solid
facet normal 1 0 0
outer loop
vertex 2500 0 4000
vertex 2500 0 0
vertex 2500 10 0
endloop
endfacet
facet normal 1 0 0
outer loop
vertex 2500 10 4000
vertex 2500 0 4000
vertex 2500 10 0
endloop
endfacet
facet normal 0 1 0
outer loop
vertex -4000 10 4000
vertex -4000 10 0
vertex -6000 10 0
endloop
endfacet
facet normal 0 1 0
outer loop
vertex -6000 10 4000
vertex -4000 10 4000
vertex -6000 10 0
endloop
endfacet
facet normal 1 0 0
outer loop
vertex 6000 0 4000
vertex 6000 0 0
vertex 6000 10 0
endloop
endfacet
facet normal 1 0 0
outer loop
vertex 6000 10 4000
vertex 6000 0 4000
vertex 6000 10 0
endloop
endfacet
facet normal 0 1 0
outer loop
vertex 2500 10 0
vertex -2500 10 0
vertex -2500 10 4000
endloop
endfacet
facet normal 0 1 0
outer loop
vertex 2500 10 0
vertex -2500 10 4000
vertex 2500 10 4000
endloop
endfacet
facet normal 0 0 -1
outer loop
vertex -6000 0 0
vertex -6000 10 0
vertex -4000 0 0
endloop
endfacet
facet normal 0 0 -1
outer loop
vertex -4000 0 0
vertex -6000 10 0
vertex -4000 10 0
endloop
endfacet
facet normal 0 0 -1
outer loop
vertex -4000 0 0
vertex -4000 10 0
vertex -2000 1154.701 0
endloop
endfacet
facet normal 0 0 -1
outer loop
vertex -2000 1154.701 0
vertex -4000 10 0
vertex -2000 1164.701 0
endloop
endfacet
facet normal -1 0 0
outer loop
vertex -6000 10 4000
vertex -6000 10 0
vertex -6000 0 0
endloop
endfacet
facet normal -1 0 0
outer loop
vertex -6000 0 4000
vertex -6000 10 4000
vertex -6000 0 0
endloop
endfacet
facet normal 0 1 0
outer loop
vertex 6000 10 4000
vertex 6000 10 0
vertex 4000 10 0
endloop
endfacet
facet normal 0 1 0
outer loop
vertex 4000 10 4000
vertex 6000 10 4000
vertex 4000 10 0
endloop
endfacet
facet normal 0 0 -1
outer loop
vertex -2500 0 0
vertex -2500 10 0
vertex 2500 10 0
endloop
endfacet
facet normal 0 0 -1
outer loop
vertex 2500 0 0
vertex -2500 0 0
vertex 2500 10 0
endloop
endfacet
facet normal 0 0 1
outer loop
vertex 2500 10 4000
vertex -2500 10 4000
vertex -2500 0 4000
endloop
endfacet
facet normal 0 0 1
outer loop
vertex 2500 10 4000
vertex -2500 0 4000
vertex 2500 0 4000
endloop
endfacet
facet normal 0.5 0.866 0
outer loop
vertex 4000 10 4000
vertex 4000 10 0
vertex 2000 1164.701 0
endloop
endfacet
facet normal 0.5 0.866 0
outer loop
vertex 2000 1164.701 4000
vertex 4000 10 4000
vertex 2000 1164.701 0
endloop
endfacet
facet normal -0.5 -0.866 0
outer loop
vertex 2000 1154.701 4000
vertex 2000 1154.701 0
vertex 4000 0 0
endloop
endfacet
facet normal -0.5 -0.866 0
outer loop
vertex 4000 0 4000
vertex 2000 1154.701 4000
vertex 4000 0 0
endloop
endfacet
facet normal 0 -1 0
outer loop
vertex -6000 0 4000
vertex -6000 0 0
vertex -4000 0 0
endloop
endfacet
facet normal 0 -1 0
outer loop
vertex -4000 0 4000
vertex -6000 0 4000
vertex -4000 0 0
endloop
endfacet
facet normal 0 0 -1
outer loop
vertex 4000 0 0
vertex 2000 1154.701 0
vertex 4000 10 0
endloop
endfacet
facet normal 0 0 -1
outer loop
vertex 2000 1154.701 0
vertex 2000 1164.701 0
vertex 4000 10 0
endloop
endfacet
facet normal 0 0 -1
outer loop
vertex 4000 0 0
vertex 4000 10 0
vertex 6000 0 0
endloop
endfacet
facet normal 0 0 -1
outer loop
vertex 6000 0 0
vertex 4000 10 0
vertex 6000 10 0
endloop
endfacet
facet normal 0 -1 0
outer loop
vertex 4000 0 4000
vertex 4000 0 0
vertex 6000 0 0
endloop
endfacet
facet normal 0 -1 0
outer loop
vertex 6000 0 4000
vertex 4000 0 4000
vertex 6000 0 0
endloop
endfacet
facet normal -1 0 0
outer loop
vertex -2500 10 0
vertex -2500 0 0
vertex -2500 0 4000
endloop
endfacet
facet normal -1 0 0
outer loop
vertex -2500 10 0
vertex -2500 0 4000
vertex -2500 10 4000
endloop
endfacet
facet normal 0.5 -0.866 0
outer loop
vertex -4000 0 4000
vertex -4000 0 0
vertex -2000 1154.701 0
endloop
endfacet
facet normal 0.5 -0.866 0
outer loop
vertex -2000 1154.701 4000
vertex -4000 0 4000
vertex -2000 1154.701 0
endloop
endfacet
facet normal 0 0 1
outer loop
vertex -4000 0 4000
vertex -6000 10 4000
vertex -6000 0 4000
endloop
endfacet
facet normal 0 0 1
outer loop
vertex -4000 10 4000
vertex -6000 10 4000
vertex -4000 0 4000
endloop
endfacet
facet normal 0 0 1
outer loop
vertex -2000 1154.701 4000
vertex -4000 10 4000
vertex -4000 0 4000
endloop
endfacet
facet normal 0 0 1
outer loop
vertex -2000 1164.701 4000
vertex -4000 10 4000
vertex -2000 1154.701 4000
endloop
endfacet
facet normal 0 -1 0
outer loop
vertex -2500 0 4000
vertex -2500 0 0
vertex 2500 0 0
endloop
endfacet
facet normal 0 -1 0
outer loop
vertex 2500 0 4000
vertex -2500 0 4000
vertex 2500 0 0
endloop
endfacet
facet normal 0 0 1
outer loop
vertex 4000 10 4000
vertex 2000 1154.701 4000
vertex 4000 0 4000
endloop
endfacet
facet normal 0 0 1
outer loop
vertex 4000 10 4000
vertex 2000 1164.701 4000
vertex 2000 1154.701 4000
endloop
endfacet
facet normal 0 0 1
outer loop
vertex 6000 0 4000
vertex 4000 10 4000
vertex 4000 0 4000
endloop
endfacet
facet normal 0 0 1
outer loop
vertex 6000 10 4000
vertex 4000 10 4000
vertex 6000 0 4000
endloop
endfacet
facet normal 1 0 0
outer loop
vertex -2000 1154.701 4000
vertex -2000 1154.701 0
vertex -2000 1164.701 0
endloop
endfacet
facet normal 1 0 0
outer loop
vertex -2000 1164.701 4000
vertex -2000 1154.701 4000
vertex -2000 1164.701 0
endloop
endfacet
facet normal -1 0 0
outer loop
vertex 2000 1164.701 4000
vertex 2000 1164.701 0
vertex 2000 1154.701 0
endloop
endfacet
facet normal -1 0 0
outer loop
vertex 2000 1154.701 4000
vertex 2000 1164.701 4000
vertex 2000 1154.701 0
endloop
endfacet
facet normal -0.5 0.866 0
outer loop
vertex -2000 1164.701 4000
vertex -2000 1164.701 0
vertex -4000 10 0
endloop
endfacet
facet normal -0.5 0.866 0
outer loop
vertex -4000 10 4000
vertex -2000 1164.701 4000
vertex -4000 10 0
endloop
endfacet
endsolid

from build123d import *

# Parameters (mm, degrees)
F0_W     = 5000
F0_H     = 10
F1_DEPTH = 4000


with BuildPart() as f1:
    # F0 (on Top) → F1 (new body)
    with BuildSketch(Plane.XY):
        with Locations((0, 5)):
            Rectangle(F0_W, F0_H)
        Polygon((2000, 1154.700538), (4000, 0), (6000, 0), (6000, 10), (4000, 10), (2000, 1164.700538), align=None)
        Polygon((-6000, 10), (-6000, 0), (-4000, 0), (-2000, 1154.700538), (-2000, 1164.700538), (-4000, 10), align=None)
    extrude(amount=F1_DEPTH)


solid = f1.part
